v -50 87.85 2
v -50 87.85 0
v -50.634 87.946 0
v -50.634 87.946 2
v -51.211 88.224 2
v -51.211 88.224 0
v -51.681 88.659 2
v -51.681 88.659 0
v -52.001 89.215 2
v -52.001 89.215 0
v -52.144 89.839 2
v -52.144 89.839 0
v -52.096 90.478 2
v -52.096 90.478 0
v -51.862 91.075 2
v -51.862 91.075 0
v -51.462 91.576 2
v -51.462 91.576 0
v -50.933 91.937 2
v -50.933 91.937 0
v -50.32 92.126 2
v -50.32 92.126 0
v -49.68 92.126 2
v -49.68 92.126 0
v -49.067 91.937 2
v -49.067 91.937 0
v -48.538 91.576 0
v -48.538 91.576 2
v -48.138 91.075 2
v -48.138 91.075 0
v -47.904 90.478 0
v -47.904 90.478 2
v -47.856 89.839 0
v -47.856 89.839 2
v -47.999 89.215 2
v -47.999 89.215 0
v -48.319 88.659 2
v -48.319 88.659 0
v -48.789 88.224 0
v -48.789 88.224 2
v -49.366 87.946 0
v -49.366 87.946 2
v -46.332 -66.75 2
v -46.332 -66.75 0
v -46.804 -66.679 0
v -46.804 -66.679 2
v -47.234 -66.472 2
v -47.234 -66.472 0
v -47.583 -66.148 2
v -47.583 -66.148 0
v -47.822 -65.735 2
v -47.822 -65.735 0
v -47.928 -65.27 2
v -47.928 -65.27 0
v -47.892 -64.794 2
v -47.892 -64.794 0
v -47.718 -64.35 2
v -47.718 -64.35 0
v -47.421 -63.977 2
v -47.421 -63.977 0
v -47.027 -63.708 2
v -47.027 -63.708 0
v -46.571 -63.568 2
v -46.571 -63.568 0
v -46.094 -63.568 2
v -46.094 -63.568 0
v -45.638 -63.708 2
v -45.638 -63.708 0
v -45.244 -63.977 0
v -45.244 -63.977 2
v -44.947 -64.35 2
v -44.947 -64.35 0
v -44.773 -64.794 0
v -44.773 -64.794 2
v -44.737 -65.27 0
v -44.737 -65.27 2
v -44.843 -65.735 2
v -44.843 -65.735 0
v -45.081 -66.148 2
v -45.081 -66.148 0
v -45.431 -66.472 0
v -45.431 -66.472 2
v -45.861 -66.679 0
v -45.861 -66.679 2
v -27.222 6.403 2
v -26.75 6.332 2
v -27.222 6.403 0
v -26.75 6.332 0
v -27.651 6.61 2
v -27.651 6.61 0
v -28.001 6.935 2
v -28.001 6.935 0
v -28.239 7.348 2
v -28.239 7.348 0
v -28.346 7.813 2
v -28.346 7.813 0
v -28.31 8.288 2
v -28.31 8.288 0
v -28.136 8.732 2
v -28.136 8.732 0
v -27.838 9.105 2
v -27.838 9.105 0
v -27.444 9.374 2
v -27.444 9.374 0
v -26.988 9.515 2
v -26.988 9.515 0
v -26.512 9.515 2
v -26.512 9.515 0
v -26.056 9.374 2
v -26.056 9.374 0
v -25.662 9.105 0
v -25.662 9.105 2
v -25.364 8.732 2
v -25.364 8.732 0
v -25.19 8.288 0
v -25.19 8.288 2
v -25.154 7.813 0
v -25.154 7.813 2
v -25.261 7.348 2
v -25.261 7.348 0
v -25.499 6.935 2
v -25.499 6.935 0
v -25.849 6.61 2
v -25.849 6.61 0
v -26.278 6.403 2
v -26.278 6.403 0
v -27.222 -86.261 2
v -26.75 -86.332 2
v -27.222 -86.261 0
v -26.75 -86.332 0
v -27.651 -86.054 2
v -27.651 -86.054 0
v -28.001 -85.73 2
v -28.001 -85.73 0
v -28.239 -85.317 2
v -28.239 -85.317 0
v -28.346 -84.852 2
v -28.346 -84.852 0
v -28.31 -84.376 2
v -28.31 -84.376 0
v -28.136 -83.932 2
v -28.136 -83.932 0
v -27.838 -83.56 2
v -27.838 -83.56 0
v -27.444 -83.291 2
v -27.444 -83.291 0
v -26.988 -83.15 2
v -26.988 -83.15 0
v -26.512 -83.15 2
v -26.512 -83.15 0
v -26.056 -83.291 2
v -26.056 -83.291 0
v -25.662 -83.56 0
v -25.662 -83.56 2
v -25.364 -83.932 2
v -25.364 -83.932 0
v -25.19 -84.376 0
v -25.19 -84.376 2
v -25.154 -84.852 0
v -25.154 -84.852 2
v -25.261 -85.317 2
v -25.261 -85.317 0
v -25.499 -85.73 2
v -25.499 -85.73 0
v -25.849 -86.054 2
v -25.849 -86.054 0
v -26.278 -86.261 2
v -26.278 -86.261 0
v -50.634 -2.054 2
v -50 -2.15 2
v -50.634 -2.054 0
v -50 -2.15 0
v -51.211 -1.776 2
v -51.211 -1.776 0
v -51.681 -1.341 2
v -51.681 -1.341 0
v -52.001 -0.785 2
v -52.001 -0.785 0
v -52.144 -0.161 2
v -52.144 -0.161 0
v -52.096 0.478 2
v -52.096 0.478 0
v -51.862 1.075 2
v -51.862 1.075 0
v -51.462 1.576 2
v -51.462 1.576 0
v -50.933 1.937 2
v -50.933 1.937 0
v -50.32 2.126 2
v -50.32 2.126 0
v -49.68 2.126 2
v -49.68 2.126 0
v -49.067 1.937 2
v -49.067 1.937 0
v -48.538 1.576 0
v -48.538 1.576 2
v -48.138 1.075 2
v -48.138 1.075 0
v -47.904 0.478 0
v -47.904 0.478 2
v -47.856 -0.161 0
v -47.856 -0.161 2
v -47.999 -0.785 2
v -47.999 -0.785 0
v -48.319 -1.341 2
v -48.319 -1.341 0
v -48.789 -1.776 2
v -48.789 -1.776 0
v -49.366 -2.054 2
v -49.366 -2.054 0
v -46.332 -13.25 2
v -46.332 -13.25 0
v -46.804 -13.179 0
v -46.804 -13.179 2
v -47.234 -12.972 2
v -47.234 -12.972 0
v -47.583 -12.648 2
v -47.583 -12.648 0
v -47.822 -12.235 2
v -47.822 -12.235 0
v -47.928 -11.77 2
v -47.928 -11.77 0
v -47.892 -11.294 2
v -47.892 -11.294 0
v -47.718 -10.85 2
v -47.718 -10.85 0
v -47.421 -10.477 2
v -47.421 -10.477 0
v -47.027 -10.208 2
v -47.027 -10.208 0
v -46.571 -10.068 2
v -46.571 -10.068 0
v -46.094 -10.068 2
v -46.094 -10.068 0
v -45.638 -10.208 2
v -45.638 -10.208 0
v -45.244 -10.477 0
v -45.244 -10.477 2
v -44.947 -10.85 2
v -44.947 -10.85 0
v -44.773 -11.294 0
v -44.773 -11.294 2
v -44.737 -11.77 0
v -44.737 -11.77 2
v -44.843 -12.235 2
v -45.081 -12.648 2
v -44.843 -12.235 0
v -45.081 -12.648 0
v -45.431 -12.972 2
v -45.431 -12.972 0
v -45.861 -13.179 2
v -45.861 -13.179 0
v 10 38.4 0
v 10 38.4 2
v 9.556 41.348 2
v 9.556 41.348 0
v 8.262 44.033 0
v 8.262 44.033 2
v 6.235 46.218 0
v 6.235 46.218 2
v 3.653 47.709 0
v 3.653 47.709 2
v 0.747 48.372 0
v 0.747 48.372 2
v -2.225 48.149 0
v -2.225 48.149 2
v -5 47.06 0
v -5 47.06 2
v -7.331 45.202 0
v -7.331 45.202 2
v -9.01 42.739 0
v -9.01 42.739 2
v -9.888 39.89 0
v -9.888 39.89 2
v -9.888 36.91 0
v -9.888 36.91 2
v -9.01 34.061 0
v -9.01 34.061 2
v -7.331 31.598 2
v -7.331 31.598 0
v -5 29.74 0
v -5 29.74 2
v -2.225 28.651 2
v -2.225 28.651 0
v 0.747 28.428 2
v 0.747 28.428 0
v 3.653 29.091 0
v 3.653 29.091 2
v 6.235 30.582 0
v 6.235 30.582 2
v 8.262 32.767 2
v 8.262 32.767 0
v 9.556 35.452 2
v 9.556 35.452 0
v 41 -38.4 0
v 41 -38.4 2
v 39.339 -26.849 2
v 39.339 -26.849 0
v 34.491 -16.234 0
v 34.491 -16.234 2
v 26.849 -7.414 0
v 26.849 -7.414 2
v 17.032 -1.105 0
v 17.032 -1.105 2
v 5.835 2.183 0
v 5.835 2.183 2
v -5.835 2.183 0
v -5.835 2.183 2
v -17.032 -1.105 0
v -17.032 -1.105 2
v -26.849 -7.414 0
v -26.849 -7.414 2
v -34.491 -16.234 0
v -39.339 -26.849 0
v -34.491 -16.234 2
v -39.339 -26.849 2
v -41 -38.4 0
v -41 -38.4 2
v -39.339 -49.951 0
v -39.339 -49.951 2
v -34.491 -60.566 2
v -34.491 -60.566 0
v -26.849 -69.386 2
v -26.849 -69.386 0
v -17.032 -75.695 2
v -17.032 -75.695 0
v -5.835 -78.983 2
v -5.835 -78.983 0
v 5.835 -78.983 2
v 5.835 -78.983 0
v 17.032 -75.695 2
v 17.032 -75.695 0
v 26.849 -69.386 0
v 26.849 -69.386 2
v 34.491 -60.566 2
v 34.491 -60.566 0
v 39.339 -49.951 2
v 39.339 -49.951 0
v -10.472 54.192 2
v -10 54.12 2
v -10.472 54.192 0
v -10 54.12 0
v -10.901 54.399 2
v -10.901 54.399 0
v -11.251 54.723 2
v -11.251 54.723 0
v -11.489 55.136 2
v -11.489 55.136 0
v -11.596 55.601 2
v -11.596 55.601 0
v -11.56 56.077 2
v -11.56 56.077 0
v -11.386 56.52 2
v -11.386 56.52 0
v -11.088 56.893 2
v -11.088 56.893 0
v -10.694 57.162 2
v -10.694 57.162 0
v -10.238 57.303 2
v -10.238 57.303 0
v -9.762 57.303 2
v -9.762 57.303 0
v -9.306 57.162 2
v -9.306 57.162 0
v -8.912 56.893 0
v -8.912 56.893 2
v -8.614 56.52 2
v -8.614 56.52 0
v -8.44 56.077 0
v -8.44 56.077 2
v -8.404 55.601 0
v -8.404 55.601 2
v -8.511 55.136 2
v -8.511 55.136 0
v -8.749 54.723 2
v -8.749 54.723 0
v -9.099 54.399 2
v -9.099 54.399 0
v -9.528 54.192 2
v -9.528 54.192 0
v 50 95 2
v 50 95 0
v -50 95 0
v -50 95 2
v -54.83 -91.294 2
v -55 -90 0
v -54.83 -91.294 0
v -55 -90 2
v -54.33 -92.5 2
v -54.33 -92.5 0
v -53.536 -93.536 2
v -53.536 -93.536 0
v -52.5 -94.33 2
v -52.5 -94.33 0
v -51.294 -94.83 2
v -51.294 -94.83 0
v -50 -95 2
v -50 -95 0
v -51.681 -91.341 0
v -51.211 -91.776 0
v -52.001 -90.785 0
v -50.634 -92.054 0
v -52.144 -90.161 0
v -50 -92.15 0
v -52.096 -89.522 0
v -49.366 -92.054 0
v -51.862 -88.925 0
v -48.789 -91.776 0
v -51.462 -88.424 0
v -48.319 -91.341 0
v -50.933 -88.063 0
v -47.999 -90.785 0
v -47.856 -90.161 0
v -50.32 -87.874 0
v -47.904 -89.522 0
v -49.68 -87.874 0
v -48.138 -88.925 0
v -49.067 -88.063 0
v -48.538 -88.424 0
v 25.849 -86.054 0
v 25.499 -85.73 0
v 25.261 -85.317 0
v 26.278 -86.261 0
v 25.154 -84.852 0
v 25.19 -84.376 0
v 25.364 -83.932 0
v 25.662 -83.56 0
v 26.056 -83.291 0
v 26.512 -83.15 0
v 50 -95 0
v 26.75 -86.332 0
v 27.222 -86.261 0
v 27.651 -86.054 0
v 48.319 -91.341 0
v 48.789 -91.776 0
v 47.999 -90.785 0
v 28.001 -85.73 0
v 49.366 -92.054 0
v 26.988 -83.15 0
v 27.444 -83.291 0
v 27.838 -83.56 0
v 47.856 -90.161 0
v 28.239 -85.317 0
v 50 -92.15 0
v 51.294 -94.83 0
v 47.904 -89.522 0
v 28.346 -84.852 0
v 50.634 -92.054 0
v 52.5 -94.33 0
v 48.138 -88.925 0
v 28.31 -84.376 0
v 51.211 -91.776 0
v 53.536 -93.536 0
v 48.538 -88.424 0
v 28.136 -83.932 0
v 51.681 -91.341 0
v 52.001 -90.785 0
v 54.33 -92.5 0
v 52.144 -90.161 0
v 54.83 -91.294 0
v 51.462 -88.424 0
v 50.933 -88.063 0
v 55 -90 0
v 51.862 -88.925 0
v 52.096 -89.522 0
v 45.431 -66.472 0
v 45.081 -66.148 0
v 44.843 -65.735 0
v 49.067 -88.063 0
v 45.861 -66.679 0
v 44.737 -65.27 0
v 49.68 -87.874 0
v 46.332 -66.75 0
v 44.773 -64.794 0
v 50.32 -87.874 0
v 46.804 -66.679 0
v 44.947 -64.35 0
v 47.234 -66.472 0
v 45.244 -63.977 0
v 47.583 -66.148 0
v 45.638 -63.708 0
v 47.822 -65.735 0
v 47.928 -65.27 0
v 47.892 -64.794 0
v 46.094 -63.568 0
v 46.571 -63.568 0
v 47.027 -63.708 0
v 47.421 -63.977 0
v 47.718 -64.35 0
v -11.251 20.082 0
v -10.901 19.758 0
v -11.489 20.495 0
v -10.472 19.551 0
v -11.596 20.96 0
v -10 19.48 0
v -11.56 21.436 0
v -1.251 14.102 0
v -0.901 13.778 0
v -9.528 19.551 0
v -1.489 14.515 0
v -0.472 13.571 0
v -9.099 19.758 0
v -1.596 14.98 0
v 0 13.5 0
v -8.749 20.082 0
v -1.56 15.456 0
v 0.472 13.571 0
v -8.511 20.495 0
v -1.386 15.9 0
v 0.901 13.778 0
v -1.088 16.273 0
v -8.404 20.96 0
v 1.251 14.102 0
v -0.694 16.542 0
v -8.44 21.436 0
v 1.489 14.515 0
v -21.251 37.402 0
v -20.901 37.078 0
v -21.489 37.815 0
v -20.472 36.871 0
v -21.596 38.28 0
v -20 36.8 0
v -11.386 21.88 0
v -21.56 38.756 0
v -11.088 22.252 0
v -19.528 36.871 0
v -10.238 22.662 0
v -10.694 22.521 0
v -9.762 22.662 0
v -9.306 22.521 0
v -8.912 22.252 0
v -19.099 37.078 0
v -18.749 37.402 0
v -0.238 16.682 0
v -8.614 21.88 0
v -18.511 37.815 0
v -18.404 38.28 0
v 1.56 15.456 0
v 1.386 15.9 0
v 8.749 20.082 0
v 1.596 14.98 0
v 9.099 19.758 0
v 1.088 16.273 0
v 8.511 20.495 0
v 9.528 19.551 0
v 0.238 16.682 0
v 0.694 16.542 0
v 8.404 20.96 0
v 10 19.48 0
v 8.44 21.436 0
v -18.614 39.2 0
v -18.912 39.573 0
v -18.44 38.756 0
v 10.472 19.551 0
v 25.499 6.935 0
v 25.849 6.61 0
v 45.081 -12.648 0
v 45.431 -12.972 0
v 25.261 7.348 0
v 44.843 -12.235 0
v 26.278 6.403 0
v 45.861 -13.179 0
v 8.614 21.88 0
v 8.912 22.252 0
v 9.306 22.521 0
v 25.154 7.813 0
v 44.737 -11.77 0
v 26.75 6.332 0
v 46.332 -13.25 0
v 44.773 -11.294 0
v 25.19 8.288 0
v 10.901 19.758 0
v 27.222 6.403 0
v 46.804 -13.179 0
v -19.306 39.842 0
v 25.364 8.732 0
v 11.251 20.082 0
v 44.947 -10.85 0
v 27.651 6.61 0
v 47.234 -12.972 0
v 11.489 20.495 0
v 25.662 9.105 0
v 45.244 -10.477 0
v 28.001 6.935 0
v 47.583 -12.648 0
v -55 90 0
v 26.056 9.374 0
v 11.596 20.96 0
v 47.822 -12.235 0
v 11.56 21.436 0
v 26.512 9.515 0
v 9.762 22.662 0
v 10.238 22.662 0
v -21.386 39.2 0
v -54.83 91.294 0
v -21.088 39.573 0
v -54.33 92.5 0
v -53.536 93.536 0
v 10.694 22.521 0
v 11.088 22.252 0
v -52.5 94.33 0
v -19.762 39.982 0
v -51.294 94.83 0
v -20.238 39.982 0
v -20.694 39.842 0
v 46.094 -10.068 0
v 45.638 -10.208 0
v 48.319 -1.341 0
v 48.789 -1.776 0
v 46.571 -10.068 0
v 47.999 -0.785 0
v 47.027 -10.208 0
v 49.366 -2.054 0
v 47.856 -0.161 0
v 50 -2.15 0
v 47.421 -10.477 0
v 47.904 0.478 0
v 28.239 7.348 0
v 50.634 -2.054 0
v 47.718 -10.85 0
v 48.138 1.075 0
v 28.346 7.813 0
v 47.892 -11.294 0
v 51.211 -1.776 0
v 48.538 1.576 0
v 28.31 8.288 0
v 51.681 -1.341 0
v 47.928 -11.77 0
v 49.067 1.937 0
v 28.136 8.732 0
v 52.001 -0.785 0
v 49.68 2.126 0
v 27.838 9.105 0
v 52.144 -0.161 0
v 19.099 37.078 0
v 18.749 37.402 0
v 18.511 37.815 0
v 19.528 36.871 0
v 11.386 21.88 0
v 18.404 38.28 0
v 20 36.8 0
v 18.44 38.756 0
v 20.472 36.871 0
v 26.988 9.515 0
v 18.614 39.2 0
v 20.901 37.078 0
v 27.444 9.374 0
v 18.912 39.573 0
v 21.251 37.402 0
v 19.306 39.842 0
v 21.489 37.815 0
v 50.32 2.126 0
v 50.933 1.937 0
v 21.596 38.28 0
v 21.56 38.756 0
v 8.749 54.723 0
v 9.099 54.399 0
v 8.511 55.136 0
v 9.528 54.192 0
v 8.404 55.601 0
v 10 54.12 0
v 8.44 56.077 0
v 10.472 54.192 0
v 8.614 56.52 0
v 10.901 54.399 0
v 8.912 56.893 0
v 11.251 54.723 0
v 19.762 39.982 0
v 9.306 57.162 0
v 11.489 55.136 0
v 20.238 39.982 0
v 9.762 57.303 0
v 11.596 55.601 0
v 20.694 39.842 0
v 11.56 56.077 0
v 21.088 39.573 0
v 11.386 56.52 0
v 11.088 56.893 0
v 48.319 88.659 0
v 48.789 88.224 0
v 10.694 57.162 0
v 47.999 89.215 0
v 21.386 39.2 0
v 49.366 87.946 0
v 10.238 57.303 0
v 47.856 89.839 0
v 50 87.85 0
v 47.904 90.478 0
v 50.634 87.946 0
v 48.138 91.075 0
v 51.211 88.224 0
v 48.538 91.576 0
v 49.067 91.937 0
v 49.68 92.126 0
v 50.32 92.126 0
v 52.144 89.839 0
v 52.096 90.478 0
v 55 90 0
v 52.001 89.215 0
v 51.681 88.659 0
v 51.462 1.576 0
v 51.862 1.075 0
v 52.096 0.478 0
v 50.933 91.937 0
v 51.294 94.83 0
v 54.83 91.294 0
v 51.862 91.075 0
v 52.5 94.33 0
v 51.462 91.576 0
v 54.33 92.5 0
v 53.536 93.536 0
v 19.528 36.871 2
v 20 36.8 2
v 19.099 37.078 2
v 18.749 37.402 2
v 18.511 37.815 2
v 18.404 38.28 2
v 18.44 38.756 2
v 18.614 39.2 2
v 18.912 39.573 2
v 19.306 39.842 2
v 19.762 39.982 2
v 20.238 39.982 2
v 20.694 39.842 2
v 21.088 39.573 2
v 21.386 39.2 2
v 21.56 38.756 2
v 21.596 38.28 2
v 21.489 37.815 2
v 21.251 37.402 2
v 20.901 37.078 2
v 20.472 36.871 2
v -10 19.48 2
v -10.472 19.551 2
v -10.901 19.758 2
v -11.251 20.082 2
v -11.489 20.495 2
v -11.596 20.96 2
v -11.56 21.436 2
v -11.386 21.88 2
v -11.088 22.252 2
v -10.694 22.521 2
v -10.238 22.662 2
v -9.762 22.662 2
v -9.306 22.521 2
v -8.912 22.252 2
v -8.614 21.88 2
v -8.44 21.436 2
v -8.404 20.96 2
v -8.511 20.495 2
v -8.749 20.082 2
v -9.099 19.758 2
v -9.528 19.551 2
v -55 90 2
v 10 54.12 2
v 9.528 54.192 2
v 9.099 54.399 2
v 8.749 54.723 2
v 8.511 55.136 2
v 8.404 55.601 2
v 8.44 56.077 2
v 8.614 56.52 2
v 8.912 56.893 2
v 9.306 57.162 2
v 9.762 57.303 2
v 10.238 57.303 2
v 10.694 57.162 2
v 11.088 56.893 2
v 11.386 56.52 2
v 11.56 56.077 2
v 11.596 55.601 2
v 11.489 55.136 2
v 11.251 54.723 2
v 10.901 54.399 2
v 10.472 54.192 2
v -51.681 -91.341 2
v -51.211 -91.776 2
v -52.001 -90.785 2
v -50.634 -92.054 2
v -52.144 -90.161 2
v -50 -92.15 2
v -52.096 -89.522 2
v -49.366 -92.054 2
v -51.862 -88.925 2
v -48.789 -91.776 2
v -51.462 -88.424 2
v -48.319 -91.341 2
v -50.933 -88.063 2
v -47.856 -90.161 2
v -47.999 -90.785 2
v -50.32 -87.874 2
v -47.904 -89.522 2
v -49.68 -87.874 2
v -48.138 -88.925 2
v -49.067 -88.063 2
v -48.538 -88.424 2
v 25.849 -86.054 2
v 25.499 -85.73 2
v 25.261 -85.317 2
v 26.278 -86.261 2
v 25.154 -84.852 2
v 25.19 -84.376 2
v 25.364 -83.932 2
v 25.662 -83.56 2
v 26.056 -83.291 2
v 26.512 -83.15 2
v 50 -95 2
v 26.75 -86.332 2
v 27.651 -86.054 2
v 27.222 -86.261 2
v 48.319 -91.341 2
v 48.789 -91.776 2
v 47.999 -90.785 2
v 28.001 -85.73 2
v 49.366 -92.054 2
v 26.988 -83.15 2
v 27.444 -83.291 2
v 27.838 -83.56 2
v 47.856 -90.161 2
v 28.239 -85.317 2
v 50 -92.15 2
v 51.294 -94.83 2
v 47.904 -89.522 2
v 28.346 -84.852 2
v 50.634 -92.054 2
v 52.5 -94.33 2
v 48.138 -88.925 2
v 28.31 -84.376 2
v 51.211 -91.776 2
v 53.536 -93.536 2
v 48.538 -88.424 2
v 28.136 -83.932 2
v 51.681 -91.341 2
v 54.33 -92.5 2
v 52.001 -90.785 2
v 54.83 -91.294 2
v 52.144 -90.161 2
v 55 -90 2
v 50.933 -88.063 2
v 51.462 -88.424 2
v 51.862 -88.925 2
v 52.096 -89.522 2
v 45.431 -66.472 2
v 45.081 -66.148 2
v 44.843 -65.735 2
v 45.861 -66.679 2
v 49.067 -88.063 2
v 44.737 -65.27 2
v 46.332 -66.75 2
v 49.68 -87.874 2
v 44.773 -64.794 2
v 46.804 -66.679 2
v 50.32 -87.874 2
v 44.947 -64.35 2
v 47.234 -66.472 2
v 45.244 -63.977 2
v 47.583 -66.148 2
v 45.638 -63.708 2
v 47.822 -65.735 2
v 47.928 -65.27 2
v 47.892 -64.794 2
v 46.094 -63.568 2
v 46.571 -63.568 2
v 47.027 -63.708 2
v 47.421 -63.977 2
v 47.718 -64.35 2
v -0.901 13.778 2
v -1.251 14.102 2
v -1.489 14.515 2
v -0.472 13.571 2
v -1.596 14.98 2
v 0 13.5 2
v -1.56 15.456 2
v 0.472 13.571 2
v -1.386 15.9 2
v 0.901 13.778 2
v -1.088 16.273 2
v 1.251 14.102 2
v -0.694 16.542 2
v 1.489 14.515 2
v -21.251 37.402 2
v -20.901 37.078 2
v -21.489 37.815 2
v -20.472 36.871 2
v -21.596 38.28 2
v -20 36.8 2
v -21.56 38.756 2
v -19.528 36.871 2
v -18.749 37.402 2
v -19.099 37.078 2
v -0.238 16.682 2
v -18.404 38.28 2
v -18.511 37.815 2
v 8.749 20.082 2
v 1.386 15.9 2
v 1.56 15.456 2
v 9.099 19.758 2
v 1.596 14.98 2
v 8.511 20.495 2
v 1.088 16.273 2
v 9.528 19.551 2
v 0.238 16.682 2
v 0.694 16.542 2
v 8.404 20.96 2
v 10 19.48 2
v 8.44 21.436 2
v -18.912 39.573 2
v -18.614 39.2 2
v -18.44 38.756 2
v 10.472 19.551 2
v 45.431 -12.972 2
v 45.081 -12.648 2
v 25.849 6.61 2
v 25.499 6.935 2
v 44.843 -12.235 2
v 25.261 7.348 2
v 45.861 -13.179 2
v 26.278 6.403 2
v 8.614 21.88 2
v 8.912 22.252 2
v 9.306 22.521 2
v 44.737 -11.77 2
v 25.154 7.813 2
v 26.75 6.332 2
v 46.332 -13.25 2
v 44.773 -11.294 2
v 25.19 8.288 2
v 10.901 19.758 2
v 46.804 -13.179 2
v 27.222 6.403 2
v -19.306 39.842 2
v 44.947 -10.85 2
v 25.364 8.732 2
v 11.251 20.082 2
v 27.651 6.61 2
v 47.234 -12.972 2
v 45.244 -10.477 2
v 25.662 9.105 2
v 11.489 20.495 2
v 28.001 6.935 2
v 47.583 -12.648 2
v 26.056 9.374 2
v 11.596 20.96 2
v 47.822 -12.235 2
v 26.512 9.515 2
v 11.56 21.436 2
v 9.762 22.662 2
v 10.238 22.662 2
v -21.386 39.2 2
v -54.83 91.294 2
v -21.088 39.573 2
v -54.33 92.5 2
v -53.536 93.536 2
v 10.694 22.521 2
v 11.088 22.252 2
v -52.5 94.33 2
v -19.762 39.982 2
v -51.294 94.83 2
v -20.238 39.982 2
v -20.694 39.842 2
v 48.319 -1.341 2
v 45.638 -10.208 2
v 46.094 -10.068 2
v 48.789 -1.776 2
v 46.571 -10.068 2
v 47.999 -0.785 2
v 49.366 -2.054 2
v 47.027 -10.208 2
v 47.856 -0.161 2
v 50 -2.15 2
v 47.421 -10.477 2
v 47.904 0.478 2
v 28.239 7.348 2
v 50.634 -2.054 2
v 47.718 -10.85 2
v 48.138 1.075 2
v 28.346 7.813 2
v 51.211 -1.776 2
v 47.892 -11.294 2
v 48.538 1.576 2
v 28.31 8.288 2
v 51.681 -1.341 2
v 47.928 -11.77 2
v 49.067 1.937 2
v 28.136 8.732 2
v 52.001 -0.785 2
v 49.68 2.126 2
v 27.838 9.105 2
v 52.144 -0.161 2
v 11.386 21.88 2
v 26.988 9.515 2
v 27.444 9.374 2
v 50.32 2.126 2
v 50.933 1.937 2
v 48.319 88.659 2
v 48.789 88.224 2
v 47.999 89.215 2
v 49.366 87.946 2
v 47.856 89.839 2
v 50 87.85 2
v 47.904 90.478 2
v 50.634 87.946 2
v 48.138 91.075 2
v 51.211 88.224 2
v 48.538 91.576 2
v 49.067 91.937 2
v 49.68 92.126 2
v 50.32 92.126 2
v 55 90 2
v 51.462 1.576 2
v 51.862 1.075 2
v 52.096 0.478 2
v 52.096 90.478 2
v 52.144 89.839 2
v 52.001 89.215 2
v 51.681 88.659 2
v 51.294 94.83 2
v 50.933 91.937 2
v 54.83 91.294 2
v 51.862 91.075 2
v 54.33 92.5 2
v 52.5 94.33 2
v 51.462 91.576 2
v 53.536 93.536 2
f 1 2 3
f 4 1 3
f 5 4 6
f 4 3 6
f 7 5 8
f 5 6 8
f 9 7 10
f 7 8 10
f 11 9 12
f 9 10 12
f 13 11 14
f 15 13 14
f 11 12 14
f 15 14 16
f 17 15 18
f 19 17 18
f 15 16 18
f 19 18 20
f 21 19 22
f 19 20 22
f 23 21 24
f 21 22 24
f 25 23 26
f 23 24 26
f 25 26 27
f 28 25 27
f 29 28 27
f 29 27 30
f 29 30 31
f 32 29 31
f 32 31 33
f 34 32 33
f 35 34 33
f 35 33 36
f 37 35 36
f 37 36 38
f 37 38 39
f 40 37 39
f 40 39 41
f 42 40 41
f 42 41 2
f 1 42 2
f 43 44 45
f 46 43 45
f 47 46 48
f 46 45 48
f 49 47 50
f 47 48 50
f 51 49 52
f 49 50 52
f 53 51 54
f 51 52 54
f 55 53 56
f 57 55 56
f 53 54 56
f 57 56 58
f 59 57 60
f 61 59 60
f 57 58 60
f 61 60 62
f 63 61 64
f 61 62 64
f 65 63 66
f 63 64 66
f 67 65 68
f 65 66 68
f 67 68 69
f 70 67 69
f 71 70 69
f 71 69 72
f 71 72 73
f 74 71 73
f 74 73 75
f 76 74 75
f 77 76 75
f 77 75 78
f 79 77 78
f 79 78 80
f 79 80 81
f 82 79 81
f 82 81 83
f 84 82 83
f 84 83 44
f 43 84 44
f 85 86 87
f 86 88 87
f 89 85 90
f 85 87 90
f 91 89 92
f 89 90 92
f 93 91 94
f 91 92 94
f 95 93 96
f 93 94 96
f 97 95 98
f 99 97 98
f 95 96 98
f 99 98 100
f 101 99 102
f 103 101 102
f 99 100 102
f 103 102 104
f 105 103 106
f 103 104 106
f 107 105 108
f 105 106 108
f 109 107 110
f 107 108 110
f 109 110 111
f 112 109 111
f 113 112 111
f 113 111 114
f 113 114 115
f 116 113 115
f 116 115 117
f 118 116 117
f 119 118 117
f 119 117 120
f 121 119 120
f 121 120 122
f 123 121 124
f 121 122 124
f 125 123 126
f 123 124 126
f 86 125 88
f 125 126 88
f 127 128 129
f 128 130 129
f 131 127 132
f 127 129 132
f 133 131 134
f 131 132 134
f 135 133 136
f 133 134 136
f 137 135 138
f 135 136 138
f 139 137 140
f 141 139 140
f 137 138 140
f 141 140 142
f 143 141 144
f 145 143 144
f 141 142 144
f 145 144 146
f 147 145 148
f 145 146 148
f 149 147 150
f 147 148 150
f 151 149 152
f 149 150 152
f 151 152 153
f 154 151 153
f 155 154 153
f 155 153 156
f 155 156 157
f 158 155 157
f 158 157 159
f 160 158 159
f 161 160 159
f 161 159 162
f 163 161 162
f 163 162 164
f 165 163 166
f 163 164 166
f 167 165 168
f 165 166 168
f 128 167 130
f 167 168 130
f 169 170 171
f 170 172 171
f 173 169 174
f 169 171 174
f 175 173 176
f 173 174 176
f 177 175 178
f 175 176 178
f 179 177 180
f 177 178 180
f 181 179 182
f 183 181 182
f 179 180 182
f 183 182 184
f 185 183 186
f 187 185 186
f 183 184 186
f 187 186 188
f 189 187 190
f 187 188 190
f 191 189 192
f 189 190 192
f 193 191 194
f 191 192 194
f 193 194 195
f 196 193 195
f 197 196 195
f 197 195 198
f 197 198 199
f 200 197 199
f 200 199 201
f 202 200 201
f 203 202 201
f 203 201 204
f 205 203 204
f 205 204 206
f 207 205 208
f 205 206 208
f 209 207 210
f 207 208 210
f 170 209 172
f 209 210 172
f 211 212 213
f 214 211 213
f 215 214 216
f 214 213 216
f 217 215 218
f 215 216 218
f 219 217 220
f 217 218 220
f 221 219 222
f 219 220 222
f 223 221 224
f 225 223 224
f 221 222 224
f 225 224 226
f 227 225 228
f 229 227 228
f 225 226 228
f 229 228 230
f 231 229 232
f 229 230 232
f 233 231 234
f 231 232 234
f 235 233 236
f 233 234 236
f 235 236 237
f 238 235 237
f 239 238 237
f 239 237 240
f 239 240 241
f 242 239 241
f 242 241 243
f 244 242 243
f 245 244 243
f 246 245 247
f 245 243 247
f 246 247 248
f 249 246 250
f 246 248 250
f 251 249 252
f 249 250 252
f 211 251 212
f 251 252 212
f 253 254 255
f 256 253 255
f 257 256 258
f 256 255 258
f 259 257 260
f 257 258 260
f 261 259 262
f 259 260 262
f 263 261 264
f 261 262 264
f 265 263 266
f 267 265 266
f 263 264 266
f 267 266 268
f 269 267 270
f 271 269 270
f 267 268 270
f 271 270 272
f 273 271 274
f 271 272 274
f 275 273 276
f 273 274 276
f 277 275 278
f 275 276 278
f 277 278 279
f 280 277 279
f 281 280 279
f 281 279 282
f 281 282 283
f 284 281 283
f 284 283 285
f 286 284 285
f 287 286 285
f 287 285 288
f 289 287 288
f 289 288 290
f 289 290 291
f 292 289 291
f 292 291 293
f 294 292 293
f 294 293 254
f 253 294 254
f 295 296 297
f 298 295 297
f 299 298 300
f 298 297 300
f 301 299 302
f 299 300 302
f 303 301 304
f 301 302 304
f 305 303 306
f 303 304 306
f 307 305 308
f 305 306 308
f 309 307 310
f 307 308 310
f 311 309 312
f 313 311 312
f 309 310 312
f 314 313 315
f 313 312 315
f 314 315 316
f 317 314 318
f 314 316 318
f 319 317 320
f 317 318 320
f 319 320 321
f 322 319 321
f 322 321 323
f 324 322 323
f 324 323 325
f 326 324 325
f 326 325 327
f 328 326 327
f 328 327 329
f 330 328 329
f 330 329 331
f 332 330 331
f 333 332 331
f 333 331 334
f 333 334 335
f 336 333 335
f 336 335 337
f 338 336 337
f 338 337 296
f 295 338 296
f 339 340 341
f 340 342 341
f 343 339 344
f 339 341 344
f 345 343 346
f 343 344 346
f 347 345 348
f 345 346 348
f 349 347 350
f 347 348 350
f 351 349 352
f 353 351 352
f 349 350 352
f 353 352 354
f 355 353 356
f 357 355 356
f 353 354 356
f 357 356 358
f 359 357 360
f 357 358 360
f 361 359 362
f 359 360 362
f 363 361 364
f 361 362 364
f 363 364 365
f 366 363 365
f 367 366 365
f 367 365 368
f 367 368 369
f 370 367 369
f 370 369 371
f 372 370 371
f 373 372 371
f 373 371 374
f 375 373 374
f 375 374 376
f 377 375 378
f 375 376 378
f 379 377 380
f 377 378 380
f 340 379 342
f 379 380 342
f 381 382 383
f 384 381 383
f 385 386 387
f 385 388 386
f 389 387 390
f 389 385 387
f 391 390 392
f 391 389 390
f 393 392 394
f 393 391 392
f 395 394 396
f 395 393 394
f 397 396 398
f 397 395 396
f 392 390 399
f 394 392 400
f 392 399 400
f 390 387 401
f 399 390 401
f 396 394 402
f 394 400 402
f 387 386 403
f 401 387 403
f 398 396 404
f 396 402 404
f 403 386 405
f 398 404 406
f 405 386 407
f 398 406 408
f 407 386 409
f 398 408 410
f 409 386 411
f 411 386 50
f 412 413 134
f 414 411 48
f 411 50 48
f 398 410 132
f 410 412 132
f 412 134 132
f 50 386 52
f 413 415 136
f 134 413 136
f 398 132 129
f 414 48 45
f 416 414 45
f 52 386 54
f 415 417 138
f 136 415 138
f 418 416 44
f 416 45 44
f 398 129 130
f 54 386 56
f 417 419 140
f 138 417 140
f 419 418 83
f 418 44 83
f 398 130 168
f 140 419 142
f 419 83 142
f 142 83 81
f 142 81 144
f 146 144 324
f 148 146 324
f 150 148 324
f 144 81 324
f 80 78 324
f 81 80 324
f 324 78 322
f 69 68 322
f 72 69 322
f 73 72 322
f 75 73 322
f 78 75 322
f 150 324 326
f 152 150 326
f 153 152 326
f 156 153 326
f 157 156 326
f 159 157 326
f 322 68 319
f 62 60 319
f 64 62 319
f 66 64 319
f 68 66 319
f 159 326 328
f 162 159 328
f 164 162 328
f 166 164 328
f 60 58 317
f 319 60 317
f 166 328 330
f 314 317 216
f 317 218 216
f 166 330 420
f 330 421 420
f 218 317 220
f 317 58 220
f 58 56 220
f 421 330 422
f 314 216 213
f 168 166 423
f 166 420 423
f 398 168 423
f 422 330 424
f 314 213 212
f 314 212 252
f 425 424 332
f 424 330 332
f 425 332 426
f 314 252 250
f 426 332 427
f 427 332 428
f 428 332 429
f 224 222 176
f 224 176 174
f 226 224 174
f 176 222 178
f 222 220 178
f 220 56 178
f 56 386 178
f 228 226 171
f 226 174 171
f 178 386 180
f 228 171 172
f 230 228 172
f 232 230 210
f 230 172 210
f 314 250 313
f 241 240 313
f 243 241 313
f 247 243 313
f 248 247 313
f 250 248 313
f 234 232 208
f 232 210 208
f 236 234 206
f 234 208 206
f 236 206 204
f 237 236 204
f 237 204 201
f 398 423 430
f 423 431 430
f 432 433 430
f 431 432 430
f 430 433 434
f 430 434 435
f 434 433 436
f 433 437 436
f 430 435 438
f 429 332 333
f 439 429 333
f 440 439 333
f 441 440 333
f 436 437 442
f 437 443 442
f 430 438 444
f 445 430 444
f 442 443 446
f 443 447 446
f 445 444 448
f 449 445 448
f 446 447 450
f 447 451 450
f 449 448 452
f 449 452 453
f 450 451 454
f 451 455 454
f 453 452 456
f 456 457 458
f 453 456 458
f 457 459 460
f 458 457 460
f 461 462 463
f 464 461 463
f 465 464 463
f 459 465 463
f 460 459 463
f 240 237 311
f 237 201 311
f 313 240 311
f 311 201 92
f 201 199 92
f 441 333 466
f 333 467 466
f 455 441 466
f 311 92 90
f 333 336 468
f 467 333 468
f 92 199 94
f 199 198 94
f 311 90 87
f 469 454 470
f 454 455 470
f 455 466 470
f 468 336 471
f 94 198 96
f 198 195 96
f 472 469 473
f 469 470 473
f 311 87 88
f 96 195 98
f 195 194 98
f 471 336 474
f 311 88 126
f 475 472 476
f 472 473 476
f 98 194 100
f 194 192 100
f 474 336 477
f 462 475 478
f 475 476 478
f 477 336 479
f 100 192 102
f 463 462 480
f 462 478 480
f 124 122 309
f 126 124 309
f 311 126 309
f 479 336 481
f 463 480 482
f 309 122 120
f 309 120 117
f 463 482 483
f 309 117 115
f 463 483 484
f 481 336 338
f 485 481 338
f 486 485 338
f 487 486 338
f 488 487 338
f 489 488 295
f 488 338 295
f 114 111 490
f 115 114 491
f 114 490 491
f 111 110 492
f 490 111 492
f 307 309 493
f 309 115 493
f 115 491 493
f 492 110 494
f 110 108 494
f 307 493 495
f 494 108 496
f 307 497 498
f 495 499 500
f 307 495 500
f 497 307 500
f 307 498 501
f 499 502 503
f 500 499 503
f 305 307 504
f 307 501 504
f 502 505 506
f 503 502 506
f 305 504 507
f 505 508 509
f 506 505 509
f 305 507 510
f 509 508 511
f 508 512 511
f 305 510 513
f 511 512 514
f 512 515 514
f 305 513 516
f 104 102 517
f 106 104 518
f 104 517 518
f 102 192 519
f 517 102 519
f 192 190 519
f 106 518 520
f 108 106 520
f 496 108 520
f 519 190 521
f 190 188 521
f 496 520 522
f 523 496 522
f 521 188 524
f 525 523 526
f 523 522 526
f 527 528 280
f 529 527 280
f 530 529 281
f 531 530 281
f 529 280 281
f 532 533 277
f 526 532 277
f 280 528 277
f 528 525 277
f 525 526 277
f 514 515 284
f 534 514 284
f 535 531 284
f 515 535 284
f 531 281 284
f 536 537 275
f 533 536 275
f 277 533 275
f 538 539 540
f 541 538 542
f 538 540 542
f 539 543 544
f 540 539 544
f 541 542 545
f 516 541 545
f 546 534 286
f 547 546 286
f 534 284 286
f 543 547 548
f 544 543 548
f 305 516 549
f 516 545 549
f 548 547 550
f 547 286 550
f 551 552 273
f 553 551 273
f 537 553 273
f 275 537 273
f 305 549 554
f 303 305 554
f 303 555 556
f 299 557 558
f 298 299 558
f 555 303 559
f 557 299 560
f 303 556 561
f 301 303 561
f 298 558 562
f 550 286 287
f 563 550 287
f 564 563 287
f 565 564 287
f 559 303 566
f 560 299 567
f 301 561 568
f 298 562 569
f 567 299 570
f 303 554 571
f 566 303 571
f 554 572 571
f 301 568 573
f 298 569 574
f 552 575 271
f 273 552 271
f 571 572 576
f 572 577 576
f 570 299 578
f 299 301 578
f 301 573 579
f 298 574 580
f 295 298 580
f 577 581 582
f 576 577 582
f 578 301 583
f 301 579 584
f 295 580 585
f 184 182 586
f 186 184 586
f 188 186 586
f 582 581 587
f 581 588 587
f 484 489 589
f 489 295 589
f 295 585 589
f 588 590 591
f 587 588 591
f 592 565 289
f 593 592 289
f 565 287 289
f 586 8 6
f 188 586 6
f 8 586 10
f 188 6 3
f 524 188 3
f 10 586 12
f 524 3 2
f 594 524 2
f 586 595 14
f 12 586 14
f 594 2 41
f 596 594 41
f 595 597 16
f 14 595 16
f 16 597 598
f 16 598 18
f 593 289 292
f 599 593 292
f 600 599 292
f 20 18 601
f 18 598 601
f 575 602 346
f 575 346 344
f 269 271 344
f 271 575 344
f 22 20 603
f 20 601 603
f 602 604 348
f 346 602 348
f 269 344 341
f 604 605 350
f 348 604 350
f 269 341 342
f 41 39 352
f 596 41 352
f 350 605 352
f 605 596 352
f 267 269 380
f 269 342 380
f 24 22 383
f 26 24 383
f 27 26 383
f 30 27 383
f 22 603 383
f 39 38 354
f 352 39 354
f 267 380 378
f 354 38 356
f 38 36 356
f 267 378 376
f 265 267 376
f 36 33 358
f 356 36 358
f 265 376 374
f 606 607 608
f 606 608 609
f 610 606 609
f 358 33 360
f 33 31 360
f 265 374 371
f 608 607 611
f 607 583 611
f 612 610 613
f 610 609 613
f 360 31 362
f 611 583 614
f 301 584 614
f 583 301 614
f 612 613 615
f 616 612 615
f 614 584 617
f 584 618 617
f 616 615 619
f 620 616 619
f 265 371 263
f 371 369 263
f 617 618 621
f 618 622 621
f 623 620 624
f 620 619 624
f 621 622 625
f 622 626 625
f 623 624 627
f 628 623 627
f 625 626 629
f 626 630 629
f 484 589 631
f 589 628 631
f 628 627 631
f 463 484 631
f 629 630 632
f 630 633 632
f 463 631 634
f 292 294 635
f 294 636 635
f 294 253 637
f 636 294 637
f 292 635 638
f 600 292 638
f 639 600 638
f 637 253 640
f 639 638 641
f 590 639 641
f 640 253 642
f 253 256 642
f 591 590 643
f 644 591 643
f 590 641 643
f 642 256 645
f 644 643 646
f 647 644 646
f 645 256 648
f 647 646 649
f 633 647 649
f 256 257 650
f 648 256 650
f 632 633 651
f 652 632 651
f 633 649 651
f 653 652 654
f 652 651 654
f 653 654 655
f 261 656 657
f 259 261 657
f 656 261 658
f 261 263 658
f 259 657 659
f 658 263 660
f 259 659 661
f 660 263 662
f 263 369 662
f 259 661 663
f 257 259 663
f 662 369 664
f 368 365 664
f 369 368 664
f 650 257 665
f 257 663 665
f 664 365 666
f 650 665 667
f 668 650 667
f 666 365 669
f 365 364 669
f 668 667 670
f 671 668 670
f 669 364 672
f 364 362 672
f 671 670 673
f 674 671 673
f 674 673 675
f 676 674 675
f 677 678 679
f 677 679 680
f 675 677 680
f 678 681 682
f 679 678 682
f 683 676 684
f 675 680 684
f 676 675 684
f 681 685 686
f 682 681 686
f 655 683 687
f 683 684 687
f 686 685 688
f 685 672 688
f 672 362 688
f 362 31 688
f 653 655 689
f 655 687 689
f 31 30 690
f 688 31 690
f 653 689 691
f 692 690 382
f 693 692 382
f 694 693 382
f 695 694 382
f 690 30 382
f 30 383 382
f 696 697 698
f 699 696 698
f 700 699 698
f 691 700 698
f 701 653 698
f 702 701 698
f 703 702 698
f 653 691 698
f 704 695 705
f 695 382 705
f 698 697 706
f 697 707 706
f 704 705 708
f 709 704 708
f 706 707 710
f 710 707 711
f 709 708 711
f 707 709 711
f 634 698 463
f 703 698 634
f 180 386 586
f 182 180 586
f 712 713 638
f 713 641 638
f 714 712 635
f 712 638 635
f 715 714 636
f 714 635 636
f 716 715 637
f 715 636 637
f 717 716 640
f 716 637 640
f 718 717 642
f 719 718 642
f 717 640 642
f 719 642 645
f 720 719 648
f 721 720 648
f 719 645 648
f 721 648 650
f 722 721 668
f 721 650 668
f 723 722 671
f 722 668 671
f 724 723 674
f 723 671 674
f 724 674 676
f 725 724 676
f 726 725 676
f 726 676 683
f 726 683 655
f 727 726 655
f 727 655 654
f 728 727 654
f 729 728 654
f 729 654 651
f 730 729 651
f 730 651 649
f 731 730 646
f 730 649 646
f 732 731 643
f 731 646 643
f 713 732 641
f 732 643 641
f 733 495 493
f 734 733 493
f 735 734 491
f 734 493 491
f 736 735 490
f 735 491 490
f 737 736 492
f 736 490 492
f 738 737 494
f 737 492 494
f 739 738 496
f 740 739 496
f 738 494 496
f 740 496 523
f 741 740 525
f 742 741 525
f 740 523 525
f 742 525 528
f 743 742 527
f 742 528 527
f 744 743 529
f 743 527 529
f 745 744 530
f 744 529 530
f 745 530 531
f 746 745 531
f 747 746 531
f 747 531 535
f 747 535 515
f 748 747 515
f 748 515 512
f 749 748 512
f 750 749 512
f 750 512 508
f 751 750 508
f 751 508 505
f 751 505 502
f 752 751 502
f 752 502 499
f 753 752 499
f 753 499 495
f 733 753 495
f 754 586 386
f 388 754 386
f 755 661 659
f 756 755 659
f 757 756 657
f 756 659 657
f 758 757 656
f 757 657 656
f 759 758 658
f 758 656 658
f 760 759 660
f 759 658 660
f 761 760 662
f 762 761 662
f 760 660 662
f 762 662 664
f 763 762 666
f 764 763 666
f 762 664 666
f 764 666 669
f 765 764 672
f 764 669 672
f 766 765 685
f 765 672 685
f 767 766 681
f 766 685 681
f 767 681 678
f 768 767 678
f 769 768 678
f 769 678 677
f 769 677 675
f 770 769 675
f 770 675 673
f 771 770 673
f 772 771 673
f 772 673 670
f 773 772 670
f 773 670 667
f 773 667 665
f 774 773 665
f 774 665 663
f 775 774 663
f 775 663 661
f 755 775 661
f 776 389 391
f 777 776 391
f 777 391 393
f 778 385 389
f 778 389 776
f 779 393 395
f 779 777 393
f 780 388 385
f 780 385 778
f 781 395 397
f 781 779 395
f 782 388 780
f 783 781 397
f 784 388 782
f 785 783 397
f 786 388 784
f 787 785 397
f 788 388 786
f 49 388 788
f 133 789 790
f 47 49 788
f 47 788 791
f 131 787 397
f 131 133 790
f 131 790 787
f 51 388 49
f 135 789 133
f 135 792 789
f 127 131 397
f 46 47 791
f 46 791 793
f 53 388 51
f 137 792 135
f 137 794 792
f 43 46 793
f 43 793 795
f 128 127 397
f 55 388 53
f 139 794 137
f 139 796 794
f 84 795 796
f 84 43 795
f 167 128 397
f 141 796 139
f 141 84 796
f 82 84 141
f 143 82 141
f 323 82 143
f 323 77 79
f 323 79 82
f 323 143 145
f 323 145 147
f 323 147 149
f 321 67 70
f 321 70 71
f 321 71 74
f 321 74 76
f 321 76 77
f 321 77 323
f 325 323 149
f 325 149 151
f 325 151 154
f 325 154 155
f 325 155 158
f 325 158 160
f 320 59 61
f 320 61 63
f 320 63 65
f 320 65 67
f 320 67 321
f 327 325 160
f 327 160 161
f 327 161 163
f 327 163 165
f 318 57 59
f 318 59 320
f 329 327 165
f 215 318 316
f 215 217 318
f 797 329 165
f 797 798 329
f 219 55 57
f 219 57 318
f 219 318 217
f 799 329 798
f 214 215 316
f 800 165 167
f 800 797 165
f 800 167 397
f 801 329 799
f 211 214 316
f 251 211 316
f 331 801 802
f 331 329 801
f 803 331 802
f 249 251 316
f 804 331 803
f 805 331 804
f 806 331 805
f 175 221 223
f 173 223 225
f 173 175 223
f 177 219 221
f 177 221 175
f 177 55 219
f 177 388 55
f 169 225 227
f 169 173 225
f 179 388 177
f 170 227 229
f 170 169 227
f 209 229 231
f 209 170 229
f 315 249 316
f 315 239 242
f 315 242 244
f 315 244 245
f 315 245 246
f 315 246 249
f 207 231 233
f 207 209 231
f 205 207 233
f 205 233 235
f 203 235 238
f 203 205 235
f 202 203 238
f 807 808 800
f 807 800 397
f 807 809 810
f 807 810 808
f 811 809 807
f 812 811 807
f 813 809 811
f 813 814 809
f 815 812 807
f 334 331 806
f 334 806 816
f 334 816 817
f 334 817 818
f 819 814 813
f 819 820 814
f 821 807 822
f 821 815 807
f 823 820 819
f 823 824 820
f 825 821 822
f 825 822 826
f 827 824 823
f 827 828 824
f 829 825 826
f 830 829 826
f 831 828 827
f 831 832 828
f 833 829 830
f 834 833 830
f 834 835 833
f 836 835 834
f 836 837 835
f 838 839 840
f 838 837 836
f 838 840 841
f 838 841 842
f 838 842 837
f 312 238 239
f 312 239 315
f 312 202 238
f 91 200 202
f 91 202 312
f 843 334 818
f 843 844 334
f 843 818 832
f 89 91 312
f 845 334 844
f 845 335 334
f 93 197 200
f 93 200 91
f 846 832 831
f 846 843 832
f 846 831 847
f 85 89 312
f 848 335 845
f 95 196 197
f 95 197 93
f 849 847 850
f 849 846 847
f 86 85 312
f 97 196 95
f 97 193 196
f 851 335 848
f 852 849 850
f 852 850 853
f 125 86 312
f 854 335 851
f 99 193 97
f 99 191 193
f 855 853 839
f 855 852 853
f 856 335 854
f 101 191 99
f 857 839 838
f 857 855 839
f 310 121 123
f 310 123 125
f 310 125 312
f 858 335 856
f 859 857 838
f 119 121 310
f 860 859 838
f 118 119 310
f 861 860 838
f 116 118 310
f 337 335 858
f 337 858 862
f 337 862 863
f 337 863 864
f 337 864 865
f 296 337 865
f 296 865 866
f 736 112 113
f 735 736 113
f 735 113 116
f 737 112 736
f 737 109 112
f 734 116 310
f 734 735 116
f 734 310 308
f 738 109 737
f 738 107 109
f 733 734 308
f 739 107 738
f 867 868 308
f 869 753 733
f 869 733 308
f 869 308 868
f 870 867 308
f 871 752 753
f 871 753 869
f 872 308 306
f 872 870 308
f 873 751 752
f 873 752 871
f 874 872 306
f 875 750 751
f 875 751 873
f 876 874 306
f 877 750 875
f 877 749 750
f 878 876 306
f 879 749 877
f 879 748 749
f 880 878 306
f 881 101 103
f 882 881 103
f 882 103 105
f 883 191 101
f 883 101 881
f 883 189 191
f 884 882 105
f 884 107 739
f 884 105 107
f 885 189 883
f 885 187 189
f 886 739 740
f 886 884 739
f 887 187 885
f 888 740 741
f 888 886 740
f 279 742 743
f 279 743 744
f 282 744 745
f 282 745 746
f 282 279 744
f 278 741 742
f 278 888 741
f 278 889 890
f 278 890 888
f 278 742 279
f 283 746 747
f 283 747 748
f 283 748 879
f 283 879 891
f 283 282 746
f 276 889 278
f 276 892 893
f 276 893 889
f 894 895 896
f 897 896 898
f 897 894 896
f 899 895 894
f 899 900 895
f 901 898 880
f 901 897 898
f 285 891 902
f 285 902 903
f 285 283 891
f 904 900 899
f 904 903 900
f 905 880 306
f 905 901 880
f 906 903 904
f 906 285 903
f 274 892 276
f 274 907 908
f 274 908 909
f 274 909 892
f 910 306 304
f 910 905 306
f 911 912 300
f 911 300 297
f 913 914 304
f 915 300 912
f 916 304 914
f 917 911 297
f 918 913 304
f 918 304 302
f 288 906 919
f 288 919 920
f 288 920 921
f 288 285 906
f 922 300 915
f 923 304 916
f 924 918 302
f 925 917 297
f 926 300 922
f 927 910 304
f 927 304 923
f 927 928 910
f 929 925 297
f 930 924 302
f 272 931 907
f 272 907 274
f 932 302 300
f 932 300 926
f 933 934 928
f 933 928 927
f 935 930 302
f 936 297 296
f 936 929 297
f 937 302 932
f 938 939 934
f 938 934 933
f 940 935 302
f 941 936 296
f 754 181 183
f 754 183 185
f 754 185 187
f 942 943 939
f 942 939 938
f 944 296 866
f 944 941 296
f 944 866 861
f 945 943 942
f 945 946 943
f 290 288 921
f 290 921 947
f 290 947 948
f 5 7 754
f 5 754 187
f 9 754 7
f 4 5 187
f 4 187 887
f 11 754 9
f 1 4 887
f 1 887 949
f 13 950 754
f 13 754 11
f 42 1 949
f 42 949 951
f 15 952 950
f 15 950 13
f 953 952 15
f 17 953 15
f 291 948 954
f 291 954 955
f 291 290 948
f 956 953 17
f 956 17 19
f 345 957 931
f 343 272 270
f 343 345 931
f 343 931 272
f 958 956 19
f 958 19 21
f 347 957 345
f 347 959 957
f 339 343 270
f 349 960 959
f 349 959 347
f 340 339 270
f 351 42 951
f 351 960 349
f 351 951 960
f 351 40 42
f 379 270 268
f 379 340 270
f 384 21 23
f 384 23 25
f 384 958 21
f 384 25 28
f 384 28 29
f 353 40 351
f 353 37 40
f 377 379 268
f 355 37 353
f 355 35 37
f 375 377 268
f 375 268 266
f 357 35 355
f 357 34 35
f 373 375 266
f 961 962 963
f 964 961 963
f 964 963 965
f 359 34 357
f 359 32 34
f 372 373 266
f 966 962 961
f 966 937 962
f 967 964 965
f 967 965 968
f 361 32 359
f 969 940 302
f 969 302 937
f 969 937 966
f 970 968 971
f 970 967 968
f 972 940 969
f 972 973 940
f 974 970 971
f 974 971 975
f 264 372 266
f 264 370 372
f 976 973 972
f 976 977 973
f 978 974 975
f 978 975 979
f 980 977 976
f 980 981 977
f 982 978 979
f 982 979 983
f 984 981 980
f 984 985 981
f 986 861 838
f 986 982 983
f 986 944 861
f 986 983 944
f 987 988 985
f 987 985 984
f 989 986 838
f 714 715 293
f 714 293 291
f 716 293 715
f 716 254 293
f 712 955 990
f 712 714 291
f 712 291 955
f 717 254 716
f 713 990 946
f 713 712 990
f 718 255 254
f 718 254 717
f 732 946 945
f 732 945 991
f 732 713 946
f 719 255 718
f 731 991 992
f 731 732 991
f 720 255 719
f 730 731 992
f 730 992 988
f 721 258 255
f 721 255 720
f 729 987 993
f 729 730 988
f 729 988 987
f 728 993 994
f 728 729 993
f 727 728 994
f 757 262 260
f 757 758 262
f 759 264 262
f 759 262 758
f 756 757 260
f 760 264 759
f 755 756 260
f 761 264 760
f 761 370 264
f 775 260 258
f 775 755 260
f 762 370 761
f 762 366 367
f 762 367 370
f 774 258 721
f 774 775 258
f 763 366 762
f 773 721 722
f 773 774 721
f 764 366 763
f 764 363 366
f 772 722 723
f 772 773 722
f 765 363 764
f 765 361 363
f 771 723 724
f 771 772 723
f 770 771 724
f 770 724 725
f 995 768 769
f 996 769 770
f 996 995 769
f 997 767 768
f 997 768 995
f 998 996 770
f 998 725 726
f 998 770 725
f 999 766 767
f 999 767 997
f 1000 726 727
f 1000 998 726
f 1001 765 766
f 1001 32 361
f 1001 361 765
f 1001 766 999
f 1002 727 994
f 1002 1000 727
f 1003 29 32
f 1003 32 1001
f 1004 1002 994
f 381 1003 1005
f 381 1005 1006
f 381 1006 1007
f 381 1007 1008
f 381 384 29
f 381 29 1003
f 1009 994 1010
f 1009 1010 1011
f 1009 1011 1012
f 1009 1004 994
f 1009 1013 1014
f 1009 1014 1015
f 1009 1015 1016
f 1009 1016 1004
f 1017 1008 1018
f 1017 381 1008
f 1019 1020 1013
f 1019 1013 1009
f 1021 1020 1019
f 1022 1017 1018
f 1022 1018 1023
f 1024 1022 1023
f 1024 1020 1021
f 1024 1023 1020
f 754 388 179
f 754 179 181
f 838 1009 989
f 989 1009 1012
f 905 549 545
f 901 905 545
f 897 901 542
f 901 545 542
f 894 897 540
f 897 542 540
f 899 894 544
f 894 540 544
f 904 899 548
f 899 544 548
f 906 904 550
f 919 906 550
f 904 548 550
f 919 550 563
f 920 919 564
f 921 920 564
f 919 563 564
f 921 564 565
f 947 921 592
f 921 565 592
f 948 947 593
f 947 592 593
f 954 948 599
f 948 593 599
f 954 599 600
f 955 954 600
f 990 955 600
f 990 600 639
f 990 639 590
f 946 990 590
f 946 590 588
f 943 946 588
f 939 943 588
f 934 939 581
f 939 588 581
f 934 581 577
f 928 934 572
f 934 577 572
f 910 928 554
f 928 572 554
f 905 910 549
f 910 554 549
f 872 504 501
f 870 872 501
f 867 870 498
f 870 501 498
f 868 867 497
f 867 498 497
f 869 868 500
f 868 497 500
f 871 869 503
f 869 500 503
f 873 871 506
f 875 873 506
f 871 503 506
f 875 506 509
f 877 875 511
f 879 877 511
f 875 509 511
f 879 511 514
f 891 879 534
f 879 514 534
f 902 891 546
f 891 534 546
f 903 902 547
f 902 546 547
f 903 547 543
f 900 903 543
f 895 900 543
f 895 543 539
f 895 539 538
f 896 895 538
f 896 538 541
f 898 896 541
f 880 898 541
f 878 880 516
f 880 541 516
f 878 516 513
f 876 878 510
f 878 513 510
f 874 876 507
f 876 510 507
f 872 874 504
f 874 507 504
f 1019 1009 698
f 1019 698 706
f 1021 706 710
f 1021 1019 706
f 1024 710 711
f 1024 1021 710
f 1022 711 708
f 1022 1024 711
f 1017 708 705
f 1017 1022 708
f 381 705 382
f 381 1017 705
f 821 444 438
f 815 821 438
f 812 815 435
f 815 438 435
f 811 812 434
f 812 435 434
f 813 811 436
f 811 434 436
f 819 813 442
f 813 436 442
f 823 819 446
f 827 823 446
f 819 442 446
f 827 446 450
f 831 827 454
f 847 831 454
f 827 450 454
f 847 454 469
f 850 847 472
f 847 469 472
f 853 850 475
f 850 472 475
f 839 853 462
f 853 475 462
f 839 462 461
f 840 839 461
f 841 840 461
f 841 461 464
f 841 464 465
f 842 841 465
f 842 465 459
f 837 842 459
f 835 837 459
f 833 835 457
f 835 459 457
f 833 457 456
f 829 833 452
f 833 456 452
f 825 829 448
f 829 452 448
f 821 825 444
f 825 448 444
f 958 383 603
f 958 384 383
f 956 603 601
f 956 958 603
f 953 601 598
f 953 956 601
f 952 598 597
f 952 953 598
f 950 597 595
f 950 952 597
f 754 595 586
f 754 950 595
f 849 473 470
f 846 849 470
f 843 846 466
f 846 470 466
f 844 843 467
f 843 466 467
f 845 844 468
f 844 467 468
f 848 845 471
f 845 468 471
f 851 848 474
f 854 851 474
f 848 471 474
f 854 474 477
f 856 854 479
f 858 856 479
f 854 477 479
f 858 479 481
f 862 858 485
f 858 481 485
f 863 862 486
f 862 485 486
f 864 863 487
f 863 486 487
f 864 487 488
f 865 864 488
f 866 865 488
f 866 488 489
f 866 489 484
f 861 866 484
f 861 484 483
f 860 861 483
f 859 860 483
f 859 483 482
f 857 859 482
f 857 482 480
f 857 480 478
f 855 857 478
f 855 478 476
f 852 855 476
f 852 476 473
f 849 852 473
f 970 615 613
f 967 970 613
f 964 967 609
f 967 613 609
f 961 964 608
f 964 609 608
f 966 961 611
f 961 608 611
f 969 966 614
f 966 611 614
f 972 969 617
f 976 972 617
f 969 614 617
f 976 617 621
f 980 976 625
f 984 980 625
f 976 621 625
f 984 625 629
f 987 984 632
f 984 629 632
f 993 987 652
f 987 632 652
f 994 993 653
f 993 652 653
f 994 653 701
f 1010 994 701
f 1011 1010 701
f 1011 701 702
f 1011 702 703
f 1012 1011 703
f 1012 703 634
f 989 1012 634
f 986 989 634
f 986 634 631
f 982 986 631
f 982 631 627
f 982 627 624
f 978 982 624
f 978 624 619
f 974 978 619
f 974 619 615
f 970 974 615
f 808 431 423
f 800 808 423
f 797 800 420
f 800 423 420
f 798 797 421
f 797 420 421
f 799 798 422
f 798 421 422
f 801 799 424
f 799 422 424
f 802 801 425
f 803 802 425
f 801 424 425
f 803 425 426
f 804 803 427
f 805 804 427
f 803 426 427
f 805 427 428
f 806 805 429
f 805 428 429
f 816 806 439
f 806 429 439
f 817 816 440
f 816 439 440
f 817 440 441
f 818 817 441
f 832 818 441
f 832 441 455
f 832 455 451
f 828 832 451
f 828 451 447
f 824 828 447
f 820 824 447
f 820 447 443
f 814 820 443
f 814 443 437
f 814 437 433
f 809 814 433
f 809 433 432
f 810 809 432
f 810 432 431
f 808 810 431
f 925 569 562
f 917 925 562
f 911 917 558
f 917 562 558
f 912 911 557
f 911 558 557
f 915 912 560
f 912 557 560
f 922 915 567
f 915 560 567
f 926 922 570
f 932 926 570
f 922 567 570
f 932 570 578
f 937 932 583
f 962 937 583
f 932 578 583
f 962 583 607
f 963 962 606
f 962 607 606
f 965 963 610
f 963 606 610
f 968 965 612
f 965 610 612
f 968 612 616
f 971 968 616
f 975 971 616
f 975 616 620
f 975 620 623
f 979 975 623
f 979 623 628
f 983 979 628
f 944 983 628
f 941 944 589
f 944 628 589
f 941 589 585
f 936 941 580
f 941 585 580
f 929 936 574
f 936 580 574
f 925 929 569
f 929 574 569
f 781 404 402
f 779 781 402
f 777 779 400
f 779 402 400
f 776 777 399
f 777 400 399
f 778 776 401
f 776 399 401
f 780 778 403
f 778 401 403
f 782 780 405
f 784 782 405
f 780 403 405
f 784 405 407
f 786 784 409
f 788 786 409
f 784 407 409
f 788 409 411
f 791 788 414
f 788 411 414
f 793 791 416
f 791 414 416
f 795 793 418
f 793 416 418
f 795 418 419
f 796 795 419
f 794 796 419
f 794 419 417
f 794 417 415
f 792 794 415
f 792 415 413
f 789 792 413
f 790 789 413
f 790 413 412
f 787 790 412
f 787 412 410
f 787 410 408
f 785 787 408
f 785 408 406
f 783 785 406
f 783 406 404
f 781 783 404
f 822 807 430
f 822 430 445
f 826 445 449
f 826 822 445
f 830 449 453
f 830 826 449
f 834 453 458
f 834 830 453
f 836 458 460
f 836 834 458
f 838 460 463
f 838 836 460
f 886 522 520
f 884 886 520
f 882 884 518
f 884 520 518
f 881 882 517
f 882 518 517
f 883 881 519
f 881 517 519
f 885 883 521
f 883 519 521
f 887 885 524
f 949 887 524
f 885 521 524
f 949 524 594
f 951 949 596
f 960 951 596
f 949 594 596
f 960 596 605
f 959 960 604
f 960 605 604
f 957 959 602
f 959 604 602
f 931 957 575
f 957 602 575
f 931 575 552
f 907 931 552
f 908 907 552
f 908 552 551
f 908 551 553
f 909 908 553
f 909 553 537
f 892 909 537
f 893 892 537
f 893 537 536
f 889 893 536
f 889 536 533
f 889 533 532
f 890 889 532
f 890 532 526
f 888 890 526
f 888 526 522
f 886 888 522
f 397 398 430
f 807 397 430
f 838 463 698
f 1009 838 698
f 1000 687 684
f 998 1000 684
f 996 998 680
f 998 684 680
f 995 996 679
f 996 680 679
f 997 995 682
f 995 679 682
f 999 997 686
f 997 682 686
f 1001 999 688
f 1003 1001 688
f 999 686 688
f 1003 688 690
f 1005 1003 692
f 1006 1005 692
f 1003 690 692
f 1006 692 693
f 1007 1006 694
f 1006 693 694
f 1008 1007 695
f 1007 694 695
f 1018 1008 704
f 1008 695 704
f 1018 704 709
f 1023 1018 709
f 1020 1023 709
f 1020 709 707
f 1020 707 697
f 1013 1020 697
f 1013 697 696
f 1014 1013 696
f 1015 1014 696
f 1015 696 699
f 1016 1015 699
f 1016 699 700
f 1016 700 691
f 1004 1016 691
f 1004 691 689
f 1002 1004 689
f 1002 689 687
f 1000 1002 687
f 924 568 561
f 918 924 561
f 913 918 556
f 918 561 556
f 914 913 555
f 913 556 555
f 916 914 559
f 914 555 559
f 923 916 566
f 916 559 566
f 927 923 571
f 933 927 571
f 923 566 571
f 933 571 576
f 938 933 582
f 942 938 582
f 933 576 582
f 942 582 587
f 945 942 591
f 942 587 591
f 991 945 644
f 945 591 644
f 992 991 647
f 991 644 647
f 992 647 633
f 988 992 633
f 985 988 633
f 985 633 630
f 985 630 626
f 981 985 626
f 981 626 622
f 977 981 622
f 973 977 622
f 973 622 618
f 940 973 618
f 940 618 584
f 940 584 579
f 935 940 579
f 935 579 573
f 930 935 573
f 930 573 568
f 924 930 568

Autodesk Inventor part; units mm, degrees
ref_plane "YZ Plane" through (0, 0, 0) normal (1, 0, 0) x (0, 1, 0)
ref_plane "XZ Plane" through (0, 0, 0) normal (0, 1, 0) x (-1, 0, 0)
ref_plane "XY Plane" through (0, 0, 0) normal (0, 0, 1) x (1, 0, 0)
sketch "スケッチ1" plane through (0, 0, 0) normal (0, 0, 1) x (1, 0, 0)
  line L0 (-55, -95) -> (55, -95)
  line L1 (55, -95) -> (55, 95)
  line L2 (55, 95) -> (-55, 95)
  line L3 (-55, 95) -> (-55, -95)
  line L4 (-55, -95) -> (55, 95) construction
  line L5 (55, -95) -> (-55, 95) construction
  circle A0 centre (0, 40) radius 6.5
  line L6 (0, 40) -> (-55, 95)
  point P0 (0, 0)
  dimension "d0" = 110
  dimension "d39" = 45
extrude "プレート1" add sketch "スケッチ1" along normal blind 2 contours L3 L2 L1 L0 | A0
sketch "スケッチ2" plane through (0, 0, 2) normal (0, 0, 1) x (1, 0, 0)
  circle A0 centre (0, -40) radius 12.5
  point P0 (0, 0)
  point P1 (0, -27.5)
  point P2 (-12.5, -40)
  point P3 (0, -52.5)
  point P4 (12.5, -40)
  dimension "d8" = 25
  dimension "d11" = 360
hole "穴1" at (0, -27.5, 2) at (-12.5, -40, 2) at (0, -52.5, 2) at (12.5, -40, 2) direction (0, 0, -1) diameter 3.2 end through all clearance for "Socket Head Cap Screw" size "M3" standard "Ansi Metric M Profile"
sketch "スケッチ3" plane through (0, 0, 2) normal (0, 0, 1) x (1, 0, 0)
  circle A0 centre (0, 38.4) radius 10
  point P0 (0, 0)
  dimension "d22" = 20
  dimension "d58" = 38.4
extrude "押し出し1" cut sketch "スケッチ3" against normal blind 10
sketch "スケッチ4" plane through (0, 0, 2) normal (0, 0, 1) x (1, 0, 0)
  line L0 (-55, 95) -> (55, 95) projected
  line L1 (-55, -95) -> (-55, 95) projected
  line L2 (55, 95) -> (55, -95) projected
  line L3 (55, -95) -> (-55, -95) projected
  line L4 (50, 90) -> (-50, 90)
  line L5 (-50, 90) -> (-50, -90)
  line L6 (-50, -90) -> (50, -90)
  line L7 (50, -90) -> (50, 90)
  point P0 (0, 0)
  point P1 (-50, 0)
  point P2 (50, 0)
  dimension "d25" = 5
hole "穴2" at (-50, 90, 2) at (50, 90, 2) at (50, -90, 2) at (-50, -90, 2) at (50, 0, 2) at (-50, 0, 2) direction (0, 0, -1) diameter 4.3 end through all clearance for "Socket Head Cap Screw" size "M4" standard "Ansi Metric M Profile"
fillet "コーナーR1" radius 5 4 edges at (55, 95, 1) (-55, 95, 1) (-55, -95, 1) (55, -95, 1)
sketch "スケッチ5" plane through (0, 0, 2) normal (0, 0, 1) x (1, 0, 0)
  circle A0 centre (0, -38.4) radius 41
  point P0 (0, 0)
  dimension "d35" = 82
  dimension "d59" = 38.4
extrude "押し出し2" cut sketch "スケッチ5" against normal blind 10
sketch "スケッチ6" plane through (0, 0, 2) normal (0, 0, 1) x (1, 0, 0)
  circle A0 centre (0, -38.4) radius 41 projected
  circle A1 centre (0, -38.4) radius 53.5
  circle A2 centre (0, 38.4) radius 10 projected
  circle A3 centre (0, 38.4) radius 20
  point P0 (0, 0)
  point P1 (-46.3324, -65.15)
  point P2 (-26.75, -84.7324)
  point P3 (0, -91.9)
  point P4 (26.75, -84.7324)
  point P5 (46.3324, -65.15)
  point P6 (53.5, -38.4)
  point P7 (46.3324, -11.65)
  point P8 (26.75, 7.9324)
  point P9 (0, 15.1)
  point P10 (-26.75, 7.9324)
  point P11 (-46.3324, -11.65)
  point P12 (-53.5, -38.4)
  point P13 (-10, 55.7205)
  point P14 (-20, 38.4)
  point P15 (-10, 21.0795)
  point P16 (10, 21.0795)
  point P17 (20, 38.4)
  point P18 (10, 55.7205)
  dimension "d40" = 107
  dimension "d52" = 40
  dimension "d43" = 360
  dimension "d55" = 360
  dimension "d57" = 0
hole "穴3" at (-26.75, -84.7324, 2) at (-46.3324, -65.15, 2) at (-46.3324, -11.65, 2) at (-26.75, 7.9324, 2) at (26.75, 7.9324, 2) at (46.3324, -11.65, 2) at (46.3324, -65.15, 2) at (26.75, -84.7324, 2) at (10, 55.7205, 2) at (20, 38.4, 2) at (-20, 38.4, 2) at (-10, 55.7205, 2) at (0, 15.1, 2) at (10, 21.0795, 2) at (-10, 21.0795, 2) direction (0, 0, -1) diameter 3.2 end through all clearance for "Socket Head Cap Screw" size "M3" standard "Ansi Metric M Profile"
equation "\"d20\" = Thickness"
equation "\"d50\" = Thickness"
equation "\"d2\" = Thickness"
equation "\"BendRadius\" = Thickness"
equation "\"BendReliefWidth\" = Thickness"
equation "\"BendReliefDepth\" = 0.5 * Thickness"
equation "\"CornerReliefSize\" = 4 * Thickness"
equation "\"MinimumRemnant\" = 2 * Thickness"
equation "\"TransitionRadius\" = BendRadius"
equation "\"JacobiRadiusSize\" = BendRadius"
equation "\"GapSize\" = Thickness"
equation "\"Thickness\" = 2"
properties part number "carbonplate2" material "CFRP"
